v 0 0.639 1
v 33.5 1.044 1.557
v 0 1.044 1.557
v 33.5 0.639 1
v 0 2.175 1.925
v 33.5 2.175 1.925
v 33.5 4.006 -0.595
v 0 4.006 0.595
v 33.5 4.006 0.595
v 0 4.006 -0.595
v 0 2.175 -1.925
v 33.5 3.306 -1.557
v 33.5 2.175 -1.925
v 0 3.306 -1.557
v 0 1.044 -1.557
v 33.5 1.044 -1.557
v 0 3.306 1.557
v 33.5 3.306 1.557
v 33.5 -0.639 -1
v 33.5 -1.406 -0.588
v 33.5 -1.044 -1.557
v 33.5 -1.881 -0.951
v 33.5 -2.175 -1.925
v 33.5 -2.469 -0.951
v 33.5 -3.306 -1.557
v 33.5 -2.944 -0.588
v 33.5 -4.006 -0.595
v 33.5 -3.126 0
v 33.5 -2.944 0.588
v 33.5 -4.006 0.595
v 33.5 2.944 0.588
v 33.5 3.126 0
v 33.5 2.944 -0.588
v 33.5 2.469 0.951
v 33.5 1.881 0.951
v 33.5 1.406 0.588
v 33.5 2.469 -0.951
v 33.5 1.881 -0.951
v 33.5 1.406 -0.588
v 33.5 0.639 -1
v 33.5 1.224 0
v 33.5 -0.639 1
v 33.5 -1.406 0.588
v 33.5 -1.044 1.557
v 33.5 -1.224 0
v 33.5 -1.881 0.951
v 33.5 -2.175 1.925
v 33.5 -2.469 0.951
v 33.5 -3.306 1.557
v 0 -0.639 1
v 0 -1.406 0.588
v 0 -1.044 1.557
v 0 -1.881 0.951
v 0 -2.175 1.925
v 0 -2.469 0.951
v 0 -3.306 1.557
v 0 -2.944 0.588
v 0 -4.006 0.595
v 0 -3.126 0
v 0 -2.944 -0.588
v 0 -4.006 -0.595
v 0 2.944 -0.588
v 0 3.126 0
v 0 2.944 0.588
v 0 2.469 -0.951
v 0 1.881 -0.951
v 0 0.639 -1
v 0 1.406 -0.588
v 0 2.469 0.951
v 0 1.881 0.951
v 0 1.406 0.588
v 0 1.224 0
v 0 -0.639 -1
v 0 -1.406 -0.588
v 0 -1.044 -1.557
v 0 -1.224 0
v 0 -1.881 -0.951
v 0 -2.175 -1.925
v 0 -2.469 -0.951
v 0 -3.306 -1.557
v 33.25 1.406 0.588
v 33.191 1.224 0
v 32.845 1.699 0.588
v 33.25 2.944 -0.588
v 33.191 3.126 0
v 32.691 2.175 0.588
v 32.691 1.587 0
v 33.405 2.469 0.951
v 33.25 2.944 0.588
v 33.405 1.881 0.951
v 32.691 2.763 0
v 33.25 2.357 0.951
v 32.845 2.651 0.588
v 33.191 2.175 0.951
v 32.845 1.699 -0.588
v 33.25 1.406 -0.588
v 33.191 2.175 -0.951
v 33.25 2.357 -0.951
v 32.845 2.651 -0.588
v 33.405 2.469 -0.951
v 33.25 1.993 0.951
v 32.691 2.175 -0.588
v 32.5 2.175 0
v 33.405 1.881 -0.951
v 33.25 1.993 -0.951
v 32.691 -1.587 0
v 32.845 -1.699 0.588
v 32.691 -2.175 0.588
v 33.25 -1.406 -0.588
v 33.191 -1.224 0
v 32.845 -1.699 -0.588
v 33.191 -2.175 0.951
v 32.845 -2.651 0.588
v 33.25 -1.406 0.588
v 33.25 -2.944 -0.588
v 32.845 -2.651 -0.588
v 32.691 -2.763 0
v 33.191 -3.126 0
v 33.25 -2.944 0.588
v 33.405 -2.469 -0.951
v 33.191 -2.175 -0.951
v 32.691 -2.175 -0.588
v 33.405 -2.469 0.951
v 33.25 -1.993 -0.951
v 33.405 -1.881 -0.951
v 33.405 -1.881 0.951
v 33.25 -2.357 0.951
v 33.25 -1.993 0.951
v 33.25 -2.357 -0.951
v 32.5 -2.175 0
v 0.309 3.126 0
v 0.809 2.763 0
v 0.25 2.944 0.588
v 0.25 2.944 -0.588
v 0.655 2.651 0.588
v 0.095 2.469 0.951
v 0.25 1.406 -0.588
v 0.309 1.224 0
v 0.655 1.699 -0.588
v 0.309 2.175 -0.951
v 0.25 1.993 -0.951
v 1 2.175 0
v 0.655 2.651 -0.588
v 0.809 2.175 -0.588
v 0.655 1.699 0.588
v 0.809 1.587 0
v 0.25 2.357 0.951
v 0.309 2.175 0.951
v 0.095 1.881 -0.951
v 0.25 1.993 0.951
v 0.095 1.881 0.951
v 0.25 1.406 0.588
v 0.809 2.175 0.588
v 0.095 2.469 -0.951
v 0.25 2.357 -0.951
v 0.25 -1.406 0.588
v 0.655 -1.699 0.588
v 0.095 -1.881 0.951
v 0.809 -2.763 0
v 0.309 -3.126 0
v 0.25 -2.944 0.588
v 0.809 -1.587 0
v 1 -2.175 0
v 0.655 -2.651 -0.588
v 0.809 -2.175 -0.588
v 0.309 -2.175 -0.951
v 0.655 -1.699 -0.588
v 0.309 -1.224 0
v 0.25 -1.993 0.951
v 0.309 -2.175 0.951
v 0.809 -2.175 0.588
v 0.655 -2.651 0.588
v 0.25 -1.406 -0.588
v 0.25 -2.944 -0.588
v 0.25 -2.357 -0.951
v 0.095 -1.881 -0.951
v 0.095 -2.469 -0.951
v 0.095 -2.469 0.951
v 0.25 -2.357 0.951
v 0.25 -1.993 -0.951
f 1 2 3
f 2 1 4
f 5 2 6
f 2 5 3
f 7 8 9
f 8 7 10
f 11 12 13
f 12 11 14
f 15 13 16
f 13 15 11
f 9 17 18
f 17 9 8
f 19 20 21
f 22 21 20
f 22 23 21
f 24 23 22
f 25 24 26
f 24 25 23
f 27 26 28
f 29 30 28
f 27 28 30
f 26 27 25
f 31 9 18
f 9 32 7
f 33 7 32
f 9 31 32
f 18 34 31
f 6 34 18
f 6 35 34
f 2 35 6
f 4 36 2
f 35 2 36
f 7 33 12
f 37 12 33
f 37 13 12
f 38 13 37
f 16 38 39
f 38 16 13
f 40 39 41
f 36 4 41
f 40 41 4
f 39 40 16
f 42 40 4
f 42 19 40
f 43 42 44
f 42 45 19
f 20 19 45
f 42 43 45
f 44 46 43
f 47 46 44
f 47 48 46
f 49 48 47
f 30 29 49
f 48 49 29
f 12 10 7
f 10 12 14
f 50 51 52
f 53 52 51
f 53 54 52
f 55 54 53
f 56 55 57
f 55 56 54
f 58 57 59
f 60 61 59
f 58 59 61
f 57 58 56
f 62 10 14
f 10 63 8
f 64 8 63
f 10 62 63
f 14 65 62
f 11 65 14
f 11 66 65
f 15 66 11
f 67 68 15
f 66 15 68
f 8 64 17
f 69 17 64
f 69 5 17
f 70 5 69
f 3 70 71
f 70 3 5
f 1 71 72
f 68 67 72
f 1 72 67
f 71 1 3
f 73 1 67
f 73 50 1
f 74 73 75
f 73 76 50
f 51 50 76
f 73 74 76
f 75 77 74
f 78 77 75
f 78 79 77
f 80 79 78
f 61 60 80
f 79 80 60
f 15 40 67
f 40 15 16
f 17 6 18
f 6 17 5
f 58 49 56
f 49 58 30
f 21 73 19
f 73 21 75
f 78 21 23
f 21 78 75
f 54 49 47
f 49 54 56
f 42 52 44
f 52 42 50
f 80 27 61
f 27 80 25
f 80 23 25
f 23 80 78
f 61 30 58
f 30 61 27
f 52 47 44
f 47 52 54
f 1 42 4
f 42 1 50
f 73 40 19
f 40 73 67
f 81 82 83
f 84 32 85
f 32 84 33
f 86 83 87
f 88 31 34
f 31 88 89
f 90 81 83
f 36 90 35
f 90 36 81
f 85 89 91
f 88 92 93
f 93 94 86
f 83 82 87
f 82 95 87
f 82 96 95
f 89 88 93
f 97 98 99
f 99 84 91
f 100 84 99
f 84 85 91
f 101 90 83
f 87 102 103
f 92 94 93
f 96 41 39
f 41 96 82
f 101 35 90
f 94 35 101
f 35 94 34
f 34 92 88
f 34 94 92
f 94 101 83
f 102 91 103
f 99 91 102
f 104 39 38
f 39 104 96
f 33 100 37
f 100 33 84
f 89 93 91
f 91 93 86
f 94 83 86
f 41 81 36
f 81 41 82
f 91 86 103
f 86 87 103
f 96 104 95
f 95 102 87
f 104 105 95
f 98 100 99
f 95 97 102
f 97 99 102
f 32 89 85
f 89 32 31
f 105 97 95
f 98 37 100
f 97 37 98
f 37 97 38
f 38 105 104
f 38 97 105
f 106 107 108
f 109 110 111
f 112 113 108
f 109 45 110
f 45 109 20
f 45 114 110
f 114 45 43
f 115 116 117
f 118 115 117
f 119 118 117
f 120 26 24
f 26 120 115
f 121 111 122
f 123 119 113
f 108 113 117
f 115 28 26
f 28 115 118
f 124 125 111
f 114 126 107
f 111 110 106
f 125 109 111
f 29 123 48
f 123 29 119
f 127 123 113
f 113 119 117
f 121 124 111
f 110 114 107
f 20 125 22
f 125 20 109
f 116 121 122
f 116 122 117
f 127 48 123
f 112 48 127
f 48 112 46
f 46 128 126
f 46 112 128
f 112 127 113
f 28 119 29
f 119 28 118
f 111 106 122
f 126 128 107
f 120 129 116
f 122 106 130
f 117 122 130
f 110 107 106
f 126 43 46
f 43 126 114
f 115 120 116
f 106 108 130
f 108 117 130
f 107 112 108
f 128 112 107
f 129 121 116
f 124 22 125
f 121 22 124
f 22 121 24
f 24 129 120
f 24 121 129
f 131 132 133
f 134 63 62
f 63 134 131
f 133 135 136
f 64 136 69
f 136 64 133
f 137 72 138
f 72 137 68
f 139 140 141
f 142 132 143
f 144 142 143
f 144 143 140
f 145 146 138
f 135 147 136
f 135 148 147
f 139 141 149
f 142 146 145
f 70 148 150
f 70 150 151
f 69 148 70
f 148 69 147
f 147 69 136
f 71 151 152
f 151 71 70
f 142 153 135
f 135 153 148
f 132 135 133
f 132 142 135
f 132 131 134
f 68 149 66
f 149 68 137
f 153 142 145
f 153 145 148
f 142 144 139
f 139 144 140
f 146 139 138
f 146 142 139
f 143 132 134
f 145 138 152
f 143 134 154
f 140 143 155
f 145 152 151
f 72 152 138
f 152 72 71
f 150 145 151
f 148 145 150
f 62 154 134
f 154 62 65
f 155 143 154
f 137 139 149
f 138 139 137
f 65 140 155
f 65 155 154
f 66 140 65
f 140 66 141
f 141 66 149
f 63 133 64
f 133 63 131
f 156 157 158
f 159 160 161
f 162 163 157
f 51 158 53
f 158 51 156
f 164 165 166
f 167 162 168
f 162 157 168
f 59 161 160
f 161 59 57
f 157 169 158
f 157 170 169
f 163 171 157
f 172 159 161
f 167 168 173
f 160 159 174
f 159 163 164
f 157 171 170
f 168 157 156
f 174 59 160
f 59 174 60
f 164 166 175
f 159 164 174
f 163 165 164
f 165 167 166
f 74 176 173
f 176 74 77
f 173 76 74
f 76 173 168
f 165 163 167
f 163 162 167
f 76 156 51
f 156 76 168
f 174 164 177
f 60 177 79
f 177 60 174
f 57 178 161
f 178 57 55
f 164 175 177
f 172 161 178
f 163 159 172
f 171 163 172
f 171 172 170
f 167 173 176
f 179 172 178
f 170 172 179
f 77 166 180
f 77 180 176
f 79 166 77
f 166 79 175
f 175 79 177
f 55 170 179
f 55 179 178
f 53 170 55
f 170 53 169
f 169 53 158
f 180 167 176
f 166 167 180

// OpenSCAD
module connector(length, radius, gap)
{
	halfgap = gap / 2;

	difference()
	{
		// Lay down the basic connector
		union()
		{
			// lay down cylinders
			rotate([0,90,0]) translate([0,radius+halfgap]) 
				cylinder(h=length, r=radius, $fn=10);
			rotate([0,90,0]) translate([0,-radius-halfgap]) 
				cylinder(h=length, r=radius, $fn=10);
	
			// lay down connecting block
			translate([length/2,0,0]) 
				cube(size=[length, 2,2], center=true);
		}
	
		// Remove end dimples
		// +x end
		translate([length, radius+halfgap, 0])
			sphere(r=1, $fn=10);
		translate([length, -radius-halfgap, 0])
			sphere(r=1, $fn=10);

		// -x end
		translate([0, radius+halfgap, 0])
			sphere(r=1, $fn=10);
		translate([0, -radius-halfgap, 0])
			sphere(r=1, $fn=10);

		// Remove a little from the top and bottom
//		rotate([0,90,0]) translate([0,radius]) 
//				cylinder(h=length, r=radius, $fn=10);
	}
}

connector(33.5, 3.85/2, 0.5);
